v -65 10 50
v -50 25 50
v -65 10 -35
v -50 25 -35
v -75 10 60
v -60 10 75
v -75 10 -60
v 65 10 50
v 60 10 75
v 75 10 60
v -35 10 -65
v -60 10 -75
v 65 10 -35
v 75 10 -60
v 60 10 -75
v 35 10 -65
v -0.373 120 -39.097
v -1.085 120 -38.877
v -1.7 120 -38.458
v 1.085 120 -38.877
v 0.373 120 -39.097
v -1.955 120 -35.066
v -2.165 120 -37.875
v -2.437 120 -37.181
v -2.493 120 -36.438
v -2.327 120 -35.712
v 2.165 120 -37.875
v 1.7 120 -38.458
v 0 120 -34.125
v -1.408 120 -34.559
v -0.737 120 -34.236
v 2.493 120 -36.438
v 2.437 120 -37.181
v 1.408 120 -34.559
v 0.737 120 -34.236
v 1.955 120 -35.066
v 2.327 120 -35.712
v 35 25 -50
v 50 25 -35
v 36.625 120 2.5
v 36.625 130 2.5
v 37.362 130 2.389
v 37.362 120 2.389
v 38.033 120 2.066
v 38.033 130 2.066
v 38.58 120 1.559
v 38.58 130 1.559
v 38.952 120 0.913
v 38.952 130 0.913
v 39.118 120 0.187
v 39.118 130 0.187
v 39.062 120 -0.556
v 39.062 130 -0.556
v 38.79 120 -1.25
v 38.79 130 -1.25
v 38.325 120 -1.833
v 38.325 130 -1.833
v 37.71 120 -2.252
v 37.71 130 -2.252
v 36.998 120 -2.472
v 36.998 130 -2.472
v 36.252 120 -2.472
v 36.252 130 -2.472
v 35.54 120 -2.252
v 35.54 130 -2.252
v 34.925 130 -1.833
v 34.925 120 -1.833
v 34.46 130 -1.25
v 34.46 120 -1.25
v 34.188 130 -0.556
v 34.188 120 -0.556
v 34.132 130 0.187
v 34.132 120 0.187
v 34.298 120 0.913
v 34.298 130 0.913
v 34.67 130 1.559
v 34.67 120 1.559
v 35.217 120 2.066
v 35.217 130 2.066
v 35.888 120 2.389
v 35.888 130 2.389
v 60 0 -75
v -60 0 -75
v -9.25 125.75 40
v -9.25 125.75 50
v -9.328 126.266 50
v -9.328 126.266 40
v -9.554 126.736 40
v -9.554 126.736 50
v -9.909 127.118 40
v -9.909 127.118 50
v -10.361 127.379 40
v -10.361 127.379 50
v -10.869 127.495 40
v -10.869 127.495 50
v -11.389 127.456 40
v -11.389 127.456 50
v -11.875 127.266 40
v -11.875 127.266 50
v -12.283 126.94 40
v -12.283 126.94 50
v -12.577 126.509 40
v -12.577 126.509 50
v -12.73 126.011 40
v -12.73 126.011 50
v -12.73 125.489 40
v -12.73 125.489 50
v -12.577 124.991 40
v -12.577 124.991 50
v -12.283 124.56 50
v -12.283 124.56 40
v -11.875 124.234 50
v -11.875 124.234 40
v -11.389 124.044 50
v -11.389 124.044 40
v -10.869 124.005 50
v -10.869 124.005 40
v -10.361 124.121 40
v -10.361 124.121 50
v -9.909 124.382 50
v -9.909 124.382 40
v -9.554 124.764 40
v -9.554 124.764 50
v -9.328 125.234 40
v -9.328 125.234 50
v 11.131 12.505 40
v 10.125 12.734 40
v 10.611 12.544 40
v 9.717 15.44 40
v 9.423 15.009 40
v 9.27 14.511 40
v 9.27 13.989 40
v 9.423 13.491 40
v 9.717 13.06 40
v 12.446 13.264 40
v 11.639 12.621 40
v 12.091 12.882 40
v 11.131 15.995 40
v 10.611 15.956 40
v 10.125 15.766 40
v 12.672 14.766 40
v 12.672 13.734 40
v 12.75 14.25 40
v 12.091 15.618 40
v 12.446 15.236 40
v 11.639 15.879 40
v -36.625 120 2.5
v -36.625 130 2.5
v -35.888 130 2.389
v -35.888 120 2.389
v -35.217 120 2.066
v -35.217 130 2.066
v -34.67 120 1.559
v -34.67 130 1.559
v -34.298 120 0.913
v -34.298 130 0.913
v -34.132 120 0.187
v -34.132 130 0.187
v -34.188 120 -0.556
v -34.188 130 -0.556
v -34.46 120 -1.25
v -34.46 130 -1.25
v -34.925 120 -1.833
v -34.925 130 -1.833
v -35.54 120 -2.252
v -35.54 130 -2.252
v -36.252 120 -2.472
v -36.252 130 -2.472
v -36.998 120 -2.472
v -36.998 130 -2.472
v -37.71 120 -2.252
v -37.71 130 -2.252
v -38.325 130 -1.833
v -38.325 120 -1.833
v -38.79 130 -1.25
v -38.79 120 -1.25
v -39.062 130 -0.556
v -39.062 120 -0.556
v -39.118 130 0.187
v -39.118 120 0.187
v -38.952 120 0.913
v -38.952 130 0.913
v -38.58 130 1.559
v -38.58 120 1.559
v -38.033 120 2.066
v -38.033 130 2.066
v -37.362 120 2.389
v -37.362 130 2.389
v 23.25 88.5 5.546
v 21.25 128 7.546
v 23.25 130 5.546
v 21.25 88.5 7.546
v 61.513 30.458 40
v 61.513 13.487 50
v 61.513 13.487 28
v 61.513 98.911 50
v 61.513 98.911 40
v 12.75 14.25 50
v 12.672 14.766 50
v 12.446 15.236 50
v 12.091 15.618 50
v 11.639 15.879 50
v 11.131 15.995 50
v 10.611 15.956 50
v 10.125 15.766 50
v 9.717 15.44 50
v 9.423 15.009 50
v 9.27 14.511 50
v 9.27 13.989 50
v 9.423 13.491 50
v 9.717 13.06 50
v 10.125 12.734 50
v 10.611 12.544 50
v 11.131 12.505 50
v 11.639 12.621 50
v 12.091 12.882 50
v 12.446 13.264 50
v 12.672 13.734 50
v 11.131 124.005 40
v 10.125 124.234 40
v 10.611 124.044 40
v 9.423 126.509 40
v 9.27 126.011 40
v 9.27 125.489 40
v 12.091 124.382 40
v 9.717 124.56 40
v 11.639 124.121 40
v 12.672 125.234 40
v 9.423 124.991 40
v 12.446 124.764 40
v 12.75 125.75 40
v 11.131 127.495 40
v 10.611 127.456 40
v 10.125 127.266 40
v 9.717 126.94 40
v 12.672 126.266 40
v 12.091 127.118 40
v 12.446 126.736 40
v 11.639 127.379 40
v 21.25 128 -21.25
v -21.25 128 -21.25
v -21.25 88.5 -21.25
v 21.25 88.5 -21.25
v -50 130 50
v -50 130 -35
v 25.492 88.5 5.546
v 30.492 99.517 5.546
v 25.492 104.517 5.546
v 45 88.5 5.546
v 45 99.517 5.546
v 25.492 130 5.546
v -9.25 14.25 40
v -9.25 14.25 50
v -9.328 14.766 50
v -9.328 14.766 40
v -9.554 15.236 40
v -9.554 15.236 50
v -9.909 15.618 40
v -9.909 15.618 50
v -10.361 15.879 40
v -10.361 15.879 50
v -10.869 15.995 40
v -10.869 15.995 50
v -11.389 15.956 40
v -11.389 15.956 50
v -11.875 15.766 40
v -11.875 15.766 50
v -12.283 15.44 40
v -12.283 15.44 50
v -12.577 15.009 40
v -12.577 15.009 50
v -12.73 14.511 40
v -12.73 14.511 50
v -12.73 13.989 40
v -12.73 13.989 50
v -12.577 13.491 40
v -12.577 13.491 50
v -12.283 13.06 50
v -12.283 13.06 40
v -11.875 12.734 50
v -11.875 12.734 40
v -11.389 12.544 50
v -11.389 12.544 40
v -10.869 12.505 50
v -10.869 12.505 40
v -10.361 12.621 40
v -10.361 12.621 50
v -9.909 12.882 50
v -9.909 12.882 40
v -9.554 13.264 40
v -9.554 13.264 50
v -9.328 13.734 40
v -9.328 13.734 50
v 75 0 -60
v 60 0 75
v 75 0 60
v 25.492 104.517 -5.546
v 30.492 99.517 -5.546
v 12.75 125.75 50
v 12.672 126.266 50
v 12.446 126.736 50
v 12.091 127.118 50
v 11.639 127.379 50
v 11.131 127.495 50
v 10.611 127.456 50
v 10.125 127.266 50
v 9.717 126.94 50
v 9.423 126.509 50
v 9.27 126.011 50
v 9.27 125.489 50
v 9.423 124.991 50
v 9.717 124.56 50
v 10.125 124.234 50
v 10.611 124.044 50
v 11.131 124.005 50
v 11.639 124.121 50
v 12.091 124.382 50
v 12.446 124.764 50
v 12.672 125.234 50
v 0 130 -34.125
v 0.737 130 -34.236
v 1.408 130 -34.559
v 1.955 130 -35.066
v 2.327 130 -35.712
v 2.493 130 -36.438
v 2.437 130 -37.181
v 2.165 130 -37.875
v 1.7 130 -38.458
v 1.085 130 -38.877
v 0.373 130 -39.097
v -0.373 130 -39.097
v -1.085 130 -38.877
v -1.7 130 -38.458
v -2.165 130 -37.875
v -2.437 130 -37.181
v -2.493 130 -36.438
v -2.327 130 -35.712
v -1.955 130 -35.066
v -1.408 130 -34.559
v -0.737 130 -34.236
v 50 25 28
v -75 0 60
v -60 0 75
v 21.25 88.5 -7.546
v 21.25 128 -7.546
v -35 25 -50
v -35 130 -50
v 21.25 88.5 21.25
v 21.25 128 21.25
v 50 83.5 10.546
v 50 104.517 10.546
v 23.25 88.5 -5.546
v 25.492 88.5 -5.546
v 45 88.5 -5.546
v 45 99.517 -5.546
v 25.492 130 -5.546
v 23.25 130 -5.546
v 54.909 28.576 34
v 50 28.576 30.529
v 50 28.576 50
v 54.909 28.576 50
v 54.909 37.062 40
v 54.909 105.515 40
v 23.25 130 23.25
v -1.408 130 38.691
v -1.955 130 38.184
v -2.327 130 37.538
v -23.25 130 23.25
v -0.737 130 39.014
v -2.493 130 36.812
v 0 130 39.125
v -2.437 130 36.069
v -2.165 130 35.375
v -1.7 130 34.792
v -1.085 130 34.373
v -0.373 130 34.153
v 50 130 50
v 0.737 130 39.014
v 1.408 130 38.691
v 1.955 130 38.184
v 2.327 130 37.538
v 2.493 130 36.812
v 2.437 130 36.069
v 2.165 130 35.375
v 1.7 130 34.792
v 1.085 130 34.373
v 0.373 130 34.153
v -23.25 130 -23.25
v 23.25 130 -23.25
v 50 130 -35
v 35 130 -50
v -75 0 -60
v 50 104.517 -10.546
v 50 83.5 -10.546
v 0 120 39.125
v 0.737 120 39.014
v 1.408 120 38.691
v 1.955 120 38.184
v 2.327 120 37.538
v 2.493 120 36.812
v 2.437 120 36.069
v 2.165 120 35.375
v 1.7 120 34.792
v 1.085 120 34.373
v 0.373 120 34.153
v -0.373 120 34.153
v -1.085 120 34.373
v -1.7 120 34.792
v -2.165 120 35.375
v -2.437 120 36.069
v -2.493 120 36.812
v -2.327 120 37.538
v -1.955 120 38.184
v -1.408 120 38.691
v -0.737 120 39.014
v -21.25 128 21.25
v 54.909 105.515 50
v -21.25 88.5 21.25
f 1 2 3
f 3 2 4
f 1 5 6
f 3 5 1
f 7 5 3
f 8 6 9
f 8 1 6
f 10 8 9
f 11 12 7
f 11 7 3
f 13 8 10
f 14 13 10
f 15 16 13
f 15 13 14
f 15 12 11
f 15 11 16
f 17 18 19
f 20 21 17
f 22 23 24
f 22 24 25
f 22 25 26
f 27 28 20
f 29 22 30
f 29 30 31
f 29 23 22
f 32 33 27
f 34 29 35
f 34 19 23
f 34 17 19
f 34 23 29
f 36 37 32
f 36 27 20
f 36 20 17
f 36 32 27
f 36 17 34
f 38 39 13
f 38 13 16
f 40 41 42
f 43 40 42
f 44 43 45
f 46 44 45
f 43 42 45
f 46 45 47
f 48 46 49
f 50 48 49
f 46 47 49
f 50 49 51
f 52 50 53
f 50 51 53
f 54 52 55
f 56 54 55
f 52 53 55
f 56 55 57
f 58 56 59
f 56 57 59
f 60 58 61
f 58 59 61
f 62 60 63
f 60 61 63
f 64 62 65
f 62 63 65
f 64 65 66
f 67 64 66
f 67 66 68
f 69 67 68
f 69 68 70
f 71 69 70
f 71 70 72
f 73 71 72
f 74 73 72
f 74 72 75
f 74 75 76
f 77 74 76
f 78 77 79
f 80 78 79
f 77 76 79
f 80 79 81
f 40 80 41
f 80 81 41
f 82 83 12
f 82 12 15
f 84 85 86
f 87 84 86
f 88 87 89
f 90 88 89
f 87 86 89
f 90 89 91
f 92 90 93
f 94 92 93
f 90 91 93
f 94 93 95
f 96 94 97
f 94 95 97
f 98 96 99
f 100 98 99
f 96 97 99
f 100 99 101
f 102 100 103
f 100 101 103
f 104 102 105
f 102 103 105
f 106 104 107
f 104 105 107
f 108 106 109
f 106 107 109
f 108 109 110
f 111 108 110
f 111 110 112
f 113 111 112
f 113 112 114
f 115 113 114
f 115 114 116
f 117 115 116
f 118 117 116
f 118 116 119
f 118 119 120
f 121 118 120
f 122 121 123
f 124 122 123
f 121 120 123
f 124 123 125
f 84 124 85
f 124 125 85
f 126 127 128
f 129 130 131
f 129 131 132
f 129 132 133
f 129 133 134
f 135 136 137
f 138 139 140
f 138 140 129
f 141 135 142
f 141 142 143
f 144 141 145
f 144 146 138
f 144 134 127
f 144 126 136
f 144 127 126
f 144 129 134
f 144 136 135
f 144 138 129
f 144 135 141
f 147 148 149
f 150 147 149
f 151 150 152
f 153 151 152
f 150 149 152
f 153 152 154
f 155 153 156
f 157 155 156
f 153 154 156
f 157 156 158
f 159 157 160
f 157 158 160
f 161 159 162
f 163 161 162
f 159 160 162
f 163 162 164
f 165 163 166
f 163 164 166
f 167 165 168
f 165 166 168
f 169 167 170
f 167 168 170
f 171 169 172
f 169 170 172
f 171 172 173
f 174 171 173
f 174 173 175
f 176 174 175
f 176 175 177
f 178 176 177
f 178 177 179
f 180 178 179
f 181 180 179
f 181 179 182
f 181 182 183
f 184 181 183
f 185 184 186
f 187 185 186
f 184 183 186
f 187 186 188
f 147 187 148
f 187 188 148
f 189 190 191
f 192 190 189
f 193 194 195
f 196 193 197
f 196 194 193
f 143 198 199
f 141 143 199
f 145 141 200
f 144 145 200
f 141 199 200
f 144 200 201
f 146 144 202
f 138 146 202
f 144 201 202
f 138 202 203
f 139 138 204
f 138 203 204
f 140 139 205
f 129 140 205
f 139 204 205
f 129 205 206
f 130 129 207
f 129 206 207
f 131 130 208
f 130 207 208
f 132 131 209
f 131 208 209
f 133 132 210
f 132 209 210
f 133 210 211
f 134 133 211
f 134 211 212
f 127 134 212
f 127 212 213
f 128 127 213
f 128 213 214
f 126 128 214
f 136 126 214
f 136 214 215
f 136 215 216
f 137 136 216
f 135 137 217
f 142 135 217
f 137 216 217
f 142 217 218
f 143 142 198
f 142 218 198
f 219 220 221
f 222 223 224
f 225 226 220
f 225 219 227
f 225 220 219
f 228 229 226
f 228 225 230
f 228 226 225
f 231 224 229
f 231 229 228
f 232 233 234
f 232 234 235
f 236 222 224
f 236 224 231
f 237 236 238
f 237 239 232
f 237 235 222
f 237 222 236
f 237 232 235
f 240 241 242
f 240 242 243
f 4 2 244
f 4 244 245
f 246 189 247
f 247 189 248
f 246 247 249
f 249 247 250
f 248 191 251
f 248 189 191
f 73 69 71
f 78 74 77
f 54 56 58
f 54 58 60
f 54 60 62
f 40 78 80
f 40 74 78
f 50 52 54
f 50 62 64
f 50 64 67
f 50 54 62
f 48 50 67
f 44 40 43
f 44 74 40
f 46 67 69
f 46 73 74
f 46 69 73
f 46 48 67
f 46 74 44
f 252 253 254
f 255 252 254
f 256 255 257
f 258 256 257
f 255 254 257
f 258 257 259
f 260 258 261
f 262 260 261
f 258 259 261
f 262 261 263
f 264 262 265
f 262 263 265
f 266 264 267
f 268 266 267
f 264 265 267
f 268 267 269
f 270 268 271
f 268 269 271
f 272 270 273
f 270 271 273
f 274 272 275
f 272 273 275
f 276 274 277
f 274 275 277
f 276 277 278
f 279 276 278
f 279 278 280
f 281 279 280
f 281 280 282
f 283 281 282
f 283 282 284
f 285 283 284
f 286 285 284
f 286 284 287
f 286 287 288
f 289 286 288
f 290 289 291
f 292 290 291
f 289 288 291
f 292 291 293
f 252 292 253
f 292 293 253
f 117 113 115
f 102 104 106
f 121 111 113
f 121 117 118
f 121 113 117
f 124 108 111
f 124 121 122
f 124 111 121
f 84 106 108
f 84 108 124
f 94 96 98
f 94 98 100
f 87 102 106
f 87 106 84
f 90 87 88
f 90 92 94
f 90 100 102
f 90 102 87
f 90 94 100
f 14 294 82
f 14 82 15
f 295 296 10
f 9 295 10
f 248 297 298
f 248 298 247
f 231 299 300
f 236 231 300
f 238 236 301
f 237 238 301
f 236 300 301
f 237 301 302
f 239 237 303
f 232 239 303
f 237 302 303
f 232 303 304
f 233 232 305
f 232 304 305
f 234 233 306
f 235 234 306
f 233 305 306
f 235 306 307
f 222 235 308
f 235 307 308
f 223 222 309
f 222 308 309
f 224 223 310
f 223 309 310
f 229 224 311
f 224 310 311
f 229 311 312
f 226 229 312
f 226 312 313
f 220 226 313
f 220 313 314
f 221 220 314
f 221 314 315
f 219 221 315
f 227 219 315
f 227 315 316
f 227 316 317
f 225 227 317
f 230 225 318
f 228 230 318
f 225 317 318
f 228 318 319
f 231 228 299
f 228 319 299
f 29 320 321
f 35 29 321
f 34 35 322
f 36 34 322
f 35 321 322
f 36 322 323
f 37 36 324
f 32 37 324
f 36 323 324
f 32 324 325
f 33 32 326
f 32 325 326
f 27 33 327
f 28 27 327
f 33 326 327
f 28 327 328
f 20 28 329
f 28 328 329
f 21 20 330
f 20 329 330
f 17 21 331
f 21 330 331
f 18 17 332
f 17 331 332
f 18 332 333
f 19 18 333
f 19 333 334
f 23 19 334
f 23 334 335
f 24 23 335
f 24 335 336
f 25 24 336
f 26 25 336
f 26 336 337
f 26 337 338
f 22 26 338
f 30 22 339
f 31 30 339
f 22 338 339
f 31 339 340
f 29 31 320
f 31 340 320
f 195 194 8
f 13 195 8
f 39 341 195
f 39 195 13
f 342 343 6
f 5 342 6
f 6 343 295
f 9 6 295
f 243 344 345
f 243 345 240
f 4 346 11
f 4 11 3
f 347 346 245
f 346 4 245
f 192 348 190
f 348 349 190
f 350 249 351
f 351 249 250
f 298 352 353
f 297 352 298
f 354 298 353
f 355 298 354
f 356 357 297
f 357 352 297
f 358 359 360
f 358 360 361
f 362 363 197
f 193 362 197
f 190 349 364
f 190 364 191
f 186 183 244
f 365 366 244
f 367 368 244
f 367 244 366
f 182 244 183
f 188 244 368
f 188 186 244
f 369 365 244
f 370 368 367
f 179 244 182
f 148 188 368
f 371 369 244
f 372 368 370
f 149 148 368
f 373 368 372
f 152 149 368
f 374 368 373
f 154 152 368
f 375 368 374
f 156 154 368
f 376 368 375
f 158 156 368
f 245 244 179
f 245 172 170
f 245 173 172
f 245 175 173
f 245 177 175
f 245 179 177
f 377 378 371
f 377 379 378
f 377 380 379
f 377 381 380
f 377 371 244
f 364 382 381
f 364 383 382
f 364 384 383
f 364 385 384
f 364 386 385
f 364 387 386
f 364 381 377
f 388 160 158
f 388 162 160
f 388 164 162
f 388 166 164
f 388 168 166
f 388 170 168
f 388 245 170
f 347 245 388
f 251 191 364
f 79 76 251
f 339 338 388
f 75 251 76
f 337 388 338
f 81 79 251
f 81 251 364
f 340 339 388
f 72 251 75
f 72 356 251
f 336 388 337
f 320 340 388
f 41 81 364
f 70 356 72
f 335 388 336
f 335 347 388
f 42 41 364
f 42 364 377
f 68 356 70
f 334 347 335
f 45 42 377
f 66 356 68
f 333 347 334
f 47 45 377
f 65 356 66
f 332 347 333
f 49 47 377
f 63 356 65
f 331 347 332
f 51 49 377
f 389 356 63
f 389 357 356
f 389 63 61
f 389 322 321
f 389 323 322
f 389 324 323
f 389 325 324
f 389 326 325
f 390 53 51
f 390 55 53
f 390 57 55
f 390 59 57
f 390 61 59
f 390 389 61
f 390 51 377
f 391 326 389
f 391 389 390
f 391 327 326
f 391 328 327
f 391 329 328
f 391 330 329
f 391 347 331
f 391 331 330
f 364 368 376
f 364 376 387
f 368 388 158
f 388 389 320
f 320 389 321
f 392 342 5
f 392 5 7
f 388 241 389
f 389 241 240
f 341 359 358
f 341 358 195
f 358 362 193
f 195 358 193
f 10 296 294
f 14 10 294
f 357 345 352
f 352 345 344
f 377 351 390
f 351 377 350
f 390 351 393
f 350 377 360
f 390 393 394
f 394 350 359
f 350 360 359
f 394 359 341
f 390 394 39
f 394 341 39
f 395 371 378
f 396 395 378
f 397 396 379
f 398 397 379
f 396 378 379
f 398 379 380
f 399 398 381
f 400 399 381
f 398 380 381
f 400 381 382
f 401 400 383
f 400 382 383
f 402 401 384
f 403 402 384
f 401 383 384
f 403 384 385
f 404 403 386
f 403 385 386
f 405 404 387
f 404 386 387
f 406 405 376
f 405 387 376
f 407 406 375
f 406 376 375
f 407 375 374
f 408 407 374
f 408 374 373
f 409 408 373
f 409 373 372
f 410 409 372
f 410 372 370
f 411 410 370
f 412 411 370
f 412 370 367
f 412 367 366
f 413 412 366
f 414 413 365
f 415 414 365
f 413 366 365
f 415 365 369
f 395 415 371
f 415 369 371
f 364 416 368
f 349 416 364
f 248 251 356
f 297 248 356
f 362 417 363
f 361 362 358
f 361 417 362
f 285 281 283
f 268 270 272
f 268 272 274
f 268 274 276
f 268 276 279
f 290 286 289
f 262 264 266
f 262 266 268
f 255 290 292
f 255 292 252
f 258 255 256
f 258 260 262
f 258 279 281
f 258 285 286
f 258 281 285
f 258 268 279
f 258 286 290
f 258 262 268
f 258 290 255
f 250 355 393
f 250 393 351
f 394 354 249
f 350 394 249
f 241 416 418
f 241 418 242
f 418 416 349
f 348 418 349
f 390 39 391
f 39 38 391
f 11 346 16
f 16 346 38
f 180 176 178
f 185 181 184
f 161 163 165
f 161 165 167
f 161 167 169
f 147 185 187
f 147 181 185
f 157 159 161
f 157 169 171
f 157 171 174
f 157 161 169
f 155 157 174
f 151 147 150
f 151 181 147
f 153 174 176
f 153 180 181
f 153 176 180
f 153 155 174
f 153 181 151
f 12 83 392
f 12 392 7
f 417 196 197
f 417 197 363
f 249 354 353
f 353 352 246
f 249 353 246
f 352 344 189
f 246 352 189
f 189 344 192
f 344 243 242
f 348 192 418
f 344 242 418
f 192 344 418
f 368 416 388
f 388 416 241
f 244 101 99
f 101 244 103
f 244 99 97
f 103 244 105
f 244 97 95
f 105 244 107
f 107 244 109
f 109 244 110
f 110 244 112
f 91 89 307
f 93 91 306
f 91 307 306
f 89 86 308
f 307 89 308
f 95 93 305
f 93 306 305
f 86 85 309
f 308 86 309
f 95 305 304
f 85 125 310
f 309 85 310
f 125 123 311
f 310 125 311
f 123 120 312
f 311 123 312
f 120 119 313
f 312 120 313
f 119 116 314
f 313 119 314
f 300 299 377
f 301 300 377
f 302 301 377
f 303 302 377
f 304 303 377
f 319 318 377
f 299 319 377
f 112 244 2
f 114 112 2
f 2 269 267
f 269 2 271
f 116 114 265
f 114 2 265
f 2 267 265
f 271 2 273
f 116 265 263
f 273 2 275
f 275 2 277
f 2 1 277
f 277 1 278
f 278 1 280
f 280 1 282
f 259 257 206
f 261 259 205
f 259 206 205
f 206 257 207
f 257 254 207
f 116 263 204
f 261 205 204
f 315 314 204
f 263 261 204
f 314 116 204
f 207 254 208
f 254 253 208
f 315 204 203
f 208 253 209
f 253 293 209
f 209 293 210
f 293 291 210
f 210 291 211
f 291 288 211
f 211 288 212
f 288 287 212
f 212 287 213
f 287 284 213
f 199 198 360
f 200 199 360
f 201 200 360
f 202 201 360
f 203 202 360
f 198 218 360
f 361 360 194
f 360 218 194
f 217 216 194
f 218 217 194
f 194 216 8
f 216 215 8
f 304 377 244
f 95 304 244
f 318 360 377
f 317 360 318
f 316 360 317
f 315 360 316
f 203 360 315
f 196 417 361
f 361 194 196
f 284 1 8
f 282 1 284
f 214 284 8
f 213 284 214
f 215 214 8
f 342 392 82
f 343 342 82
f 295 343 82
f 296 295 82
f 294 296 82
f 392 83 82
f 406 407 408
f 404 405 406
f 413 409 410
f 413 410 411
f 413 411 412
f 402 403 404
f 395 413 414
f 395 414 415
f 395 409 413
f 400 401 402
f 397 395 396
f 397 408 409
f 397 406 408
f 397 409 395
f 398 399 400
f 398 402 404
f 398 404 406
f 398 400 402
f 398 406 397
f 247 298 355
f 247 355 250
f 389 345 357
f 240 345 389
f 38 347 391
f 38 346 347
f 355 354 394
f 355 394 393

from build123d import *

# Parameters (mm, degrees)
SKETCH1_W           = 150
SKETCH1_H           = 150
BOSS_EXTRUDE1_DEPTH = 10
SKETCH2_W           = 100
SKETCH2_H           = 100
BOSS_EXTRUDE2_DEPTH = 120
SKETCH3_W           = 42.5
SKETCH3_H           = 42.5
CUT_EXTRUDE1_DEPTH  = 41.5
CHAMFER1_SIZE       = 15
CHAMFER2_SIZE       = 15
SKETCH4_W           = 4.242368117
SKETCH4_H           = 5.545736957
CUT_EXTRUDE2_DEPTH  = 41.5
SKETCH5_W           = 11.091473914
SKETCH5_H           = 11.017090126
CUT_EXTRUDE5_DEPTH  = 24.507631883
CHAMFER3_SIZE       = 5
CHAMFER4_SIZE       = 5
CHAMFER5_SIZE       = 2
SKETCH6_R           = 1.75
CUT_EXTRUDE6_DEPTH  = 10
BOSS_EXTRUDE3_DEPTH = 10
CHAMFER6_SIZE       = 12
SKETCH8_R           = 2.5
CUT_EXTRUDE7_DEPTH  = 10


with BuildPart() as part:
    # Sketch1 → Boss-Extrude1 (new body)
    with BuildSketch(Plane(origin=(0, 0, 0), x_dir=(1, 0, 0), z_dir=(0, 1, 0))):
        Rectangle(SKETCH1_W, SKETCH1_H)
    extrude(amount=BOSS_EXTRUDE1_DEPTH)

    # Sketch2 → Boss-Extrude2 (add)
    with BuildSketch(Plane(origin=(0, 10, 0), x_dir=(1, 0, 0), z_dir=(0, 1, 0))):
        Rectangle(SKETCH2_W, SKETCH2_H)
    extrude(amount=BOSS_EXTRUDE2_DEPTH)

    # Sketch3 → Cut-Extrude1 (cut)
    with BuildSketch(Plane(origin=(0, 130, 0), x_dir=(1, 0, 0), z_dir=(0, 1, 0))):
        Rectangle(SKETCH3_W, SKETCH3_H)
    extrude(amount=-CUT_EXTRUDE1_DEPTH, mode=Mode.SUBTRACT)

    # Chamfer1
    chamfer1_edges = [part.edges().sort_by_distance(p)[0] for p in [
        (75, 5, 75),
        (-75, 5, 75),
        (-75, 5, -75),
        (75, 5, -75),
    ]]
    chamfer(chamfer1_edges, length=CHAMFER1_SIZE)

    # Chamfer2
    chamfer2_edges = [part.edges().sort_by_distance(p)[0] for p in [
        (50, 10, 0),
        (0, 10, -50),
        (50, 70, -50),
        (-50, 10, 0),
        (-50, 70, -50),
    ]]
    chamfer(chamfer2_edges, length=CHAMFER2_SIZE)

    # Sketch4 → Cut-Extrude2 (cut)
    with BuildSketch(Plane(origin=(0, 130, 0), x_dir=(1, 0, 0), z_dir=(0, 1, 0))):
        with Locations((23.371184058, -2.772868478)):
            Rectangle(SKETCH4_W, SKETCH4_H)
        with Locations((23.371184058, 2.772868478)):
            Rectangle(SKETCH4_W, SKETCH4_H)
    extrude(amount=-CUT_EXTRUDE2_DEPTH, mode=Mode.SUBTRACT)

    # Sketch5 → Cut-Extrude5 (cut)
    with BuildSketch(Plane.ZY.offset(-25.492368117)):
        with Locations((0, 94.008545063)):
            Rectangle(SKETCH5_W, SKETCH5_H)
    extrude(amount=-CUT_EXTRUDE5_DEPTH, mode=Mode.SUBTRACT)

    # Chamfer3
    chamfer3_edges = [part.edges().sort_by_distance(p)[0] for p in [
        (50, 94.008545063, 5.545736957),
        (50, 88.5, 0),
        (50, 94.008545063, -5.545736957),
        (50, 99.517090126, 0),
    ]]
    chamfer(chamfer3_edges, length=CHAMFER3_SIZE)

    # Chamfer4
    chamfer4_edges = [part.edges().sort_by_distance(p)[0] for p in [
        (25.492368117, 99.517090126, 0),
    ]]
    chamfer(chamfer4_edges, length=CHAMFER4_SIZE)

    # Chamfer5
    chamfer5_edges = [part.edges().sort_by_distance(p)[0] for p in [
        (21.25, 130, -13.397868478),
        (21.25, 109.25, 5.545736957),
        (21.25, 109.25, -5.545736957),
        (21.25, 130, 13.397868478),
        (0, 130, -21.25),
        (-21.25, 130, 0),
        (0, 130, 21.25),
    ]]
    chamfer(chamfer5_edges, length=CHAMFER5_SIZE)

    # Sketch6 → Cut-Extrude6 (cut)
    with BuildSketch(Plane.XY.offset(50)):
        with Locations((-11, 125.75)):
            Circle(SKETCH6_R)
        with Locations((11, 125.75)):
            Circle(SKETCH6_R)
        with Locations((-11, 14.25)):
            Circle(SKETCH6_R)
        with Locations((11, 14.25)):
            Circle(SKETCH6_R)
    extrude(amount=-CUT_EXTRUDE6_DEPTH, mode=Mode.SUBTRACT)

    # Sketch7 → Boss-Extrude3 (add)
    with BuildSketch(Plane.XY.offset(50)):
        Polygon((54.909019499, 105.514740538), (54.909019499, 20.090980501), (61.512596017, 13.487403983), (61.512596017, 98.91116402), align=None)
    extrude(amount=-BOSS_EXTRUDE3_DEPTH)

    # Chamfer6
    chamfer6_edges = [part.edges().sort_by_distance(p)[0] for p in [
        (58.210807758, 16.789192242, 40),
    ]]
    chamfer(chamfer6_edges, length=CHAMFER6_SIZE)
    # the kernel refuses this chamfer: 12, 8.485281374 mm, written as the material it adds along each edge
    with BuildSketch(Plane(origin=(54.909019499, 20.090980501, 50), x_dir=(-0.7262819568766928, 0.687396915264654, 0), z_dir=(0, 0, -1))) as chamfer6_2_piece_1:
        with BuildLine():
            Line((12.344078342, 0), (5.484140903, 6.49265728))
            Line((5.484140903, 6.49265728), (5.309833233, 6.65763254))
            ThreePointArc((5.309833233, 6.65763254), (2.742070451, 3.24632864), (-0.17430767, 0.16497526))
            Line((-0.17430767, 0.16497526), (0.00659901, -0.23990926))
            ThreePointArc((0.00659901, -0.23990926), (6.173971977, -0.070267795), (12.350677353, -0.23990926))
            Line((12.350677353, -0.23990926), (12.344078342, 0))
        make_face()
    extrude(amount=10)
    with BuildSketch(Plane(origin=(54.909019499, 20.090980501, 40), x_dir=(-0.7262819568766887, 0.6873969152646581, 0), z_dir=(0, 0, -1))) as chamfer6_2_piece_2_section:
        with BuildLine():
            Line((12.344078342, 0), (5.484140903, 6.49265728))
            Line((5.484140903, 6.49265728), (5.309833233, 6.65763254))
            ThreePointArc((5.309833233, 6.65763254), (2.742070451, 3.24632864), (-0.17430767, 0.16497526))
            Line((-0.17430767, 0.16497526), (0.00659901, -0.23990926))
            ThreePointArc((0.00659901, -0.23990926), (6.173971977, -0.070267795), (12.350677353, -0.23990926))
            Line((12.350677353, -0.23990926), (12.344078342, 0))
        make_face()
    chamfer6_2_piece_2 = extrude(amount=42.860195856, mode=Mode.PRIVATE)
    chamfer6_2_piece_2 = split(chamfer6_2_piece_2, bisect_by=Plane(origin=(53.690480503, 27.337708231, 32.262573132), z_dir=(-0.5000000000000001, -0.5000000000000001, 0.7071067811865475)), keep=Keep.TOP, mode=Mode.PRIVATE)
    add(chamfer6_2_piece_2)

    # Sketch8 → Cut-Extrude7 (cut)
    with BuildSketch(Plane(origin=(0, 130, 0), x_dir=(1, 0, 0), z_dir=(0, 1, 0))):
        with Locations(Location((0, 36.625, 0), (0, 0, 270))):
            Circle(SKETCH8_R)
        with Locations(Location((36.625, 0, 0), (0, 0, 270))):
            Circle(SKETCH8_R)
        with Locations(Location((0, -36.625, 0), (0, 0, 270))):
            Circle(SKETCH8_R)
        with Locations(Location((-36.625, 0, 0), (0, 0, 270))):
            Circle(SKETCH8_R)
    extrude(amount=-CUT_EXTRUDE7_DEPTH, mode=Mode.SUBTRACT)


solid = part.part
